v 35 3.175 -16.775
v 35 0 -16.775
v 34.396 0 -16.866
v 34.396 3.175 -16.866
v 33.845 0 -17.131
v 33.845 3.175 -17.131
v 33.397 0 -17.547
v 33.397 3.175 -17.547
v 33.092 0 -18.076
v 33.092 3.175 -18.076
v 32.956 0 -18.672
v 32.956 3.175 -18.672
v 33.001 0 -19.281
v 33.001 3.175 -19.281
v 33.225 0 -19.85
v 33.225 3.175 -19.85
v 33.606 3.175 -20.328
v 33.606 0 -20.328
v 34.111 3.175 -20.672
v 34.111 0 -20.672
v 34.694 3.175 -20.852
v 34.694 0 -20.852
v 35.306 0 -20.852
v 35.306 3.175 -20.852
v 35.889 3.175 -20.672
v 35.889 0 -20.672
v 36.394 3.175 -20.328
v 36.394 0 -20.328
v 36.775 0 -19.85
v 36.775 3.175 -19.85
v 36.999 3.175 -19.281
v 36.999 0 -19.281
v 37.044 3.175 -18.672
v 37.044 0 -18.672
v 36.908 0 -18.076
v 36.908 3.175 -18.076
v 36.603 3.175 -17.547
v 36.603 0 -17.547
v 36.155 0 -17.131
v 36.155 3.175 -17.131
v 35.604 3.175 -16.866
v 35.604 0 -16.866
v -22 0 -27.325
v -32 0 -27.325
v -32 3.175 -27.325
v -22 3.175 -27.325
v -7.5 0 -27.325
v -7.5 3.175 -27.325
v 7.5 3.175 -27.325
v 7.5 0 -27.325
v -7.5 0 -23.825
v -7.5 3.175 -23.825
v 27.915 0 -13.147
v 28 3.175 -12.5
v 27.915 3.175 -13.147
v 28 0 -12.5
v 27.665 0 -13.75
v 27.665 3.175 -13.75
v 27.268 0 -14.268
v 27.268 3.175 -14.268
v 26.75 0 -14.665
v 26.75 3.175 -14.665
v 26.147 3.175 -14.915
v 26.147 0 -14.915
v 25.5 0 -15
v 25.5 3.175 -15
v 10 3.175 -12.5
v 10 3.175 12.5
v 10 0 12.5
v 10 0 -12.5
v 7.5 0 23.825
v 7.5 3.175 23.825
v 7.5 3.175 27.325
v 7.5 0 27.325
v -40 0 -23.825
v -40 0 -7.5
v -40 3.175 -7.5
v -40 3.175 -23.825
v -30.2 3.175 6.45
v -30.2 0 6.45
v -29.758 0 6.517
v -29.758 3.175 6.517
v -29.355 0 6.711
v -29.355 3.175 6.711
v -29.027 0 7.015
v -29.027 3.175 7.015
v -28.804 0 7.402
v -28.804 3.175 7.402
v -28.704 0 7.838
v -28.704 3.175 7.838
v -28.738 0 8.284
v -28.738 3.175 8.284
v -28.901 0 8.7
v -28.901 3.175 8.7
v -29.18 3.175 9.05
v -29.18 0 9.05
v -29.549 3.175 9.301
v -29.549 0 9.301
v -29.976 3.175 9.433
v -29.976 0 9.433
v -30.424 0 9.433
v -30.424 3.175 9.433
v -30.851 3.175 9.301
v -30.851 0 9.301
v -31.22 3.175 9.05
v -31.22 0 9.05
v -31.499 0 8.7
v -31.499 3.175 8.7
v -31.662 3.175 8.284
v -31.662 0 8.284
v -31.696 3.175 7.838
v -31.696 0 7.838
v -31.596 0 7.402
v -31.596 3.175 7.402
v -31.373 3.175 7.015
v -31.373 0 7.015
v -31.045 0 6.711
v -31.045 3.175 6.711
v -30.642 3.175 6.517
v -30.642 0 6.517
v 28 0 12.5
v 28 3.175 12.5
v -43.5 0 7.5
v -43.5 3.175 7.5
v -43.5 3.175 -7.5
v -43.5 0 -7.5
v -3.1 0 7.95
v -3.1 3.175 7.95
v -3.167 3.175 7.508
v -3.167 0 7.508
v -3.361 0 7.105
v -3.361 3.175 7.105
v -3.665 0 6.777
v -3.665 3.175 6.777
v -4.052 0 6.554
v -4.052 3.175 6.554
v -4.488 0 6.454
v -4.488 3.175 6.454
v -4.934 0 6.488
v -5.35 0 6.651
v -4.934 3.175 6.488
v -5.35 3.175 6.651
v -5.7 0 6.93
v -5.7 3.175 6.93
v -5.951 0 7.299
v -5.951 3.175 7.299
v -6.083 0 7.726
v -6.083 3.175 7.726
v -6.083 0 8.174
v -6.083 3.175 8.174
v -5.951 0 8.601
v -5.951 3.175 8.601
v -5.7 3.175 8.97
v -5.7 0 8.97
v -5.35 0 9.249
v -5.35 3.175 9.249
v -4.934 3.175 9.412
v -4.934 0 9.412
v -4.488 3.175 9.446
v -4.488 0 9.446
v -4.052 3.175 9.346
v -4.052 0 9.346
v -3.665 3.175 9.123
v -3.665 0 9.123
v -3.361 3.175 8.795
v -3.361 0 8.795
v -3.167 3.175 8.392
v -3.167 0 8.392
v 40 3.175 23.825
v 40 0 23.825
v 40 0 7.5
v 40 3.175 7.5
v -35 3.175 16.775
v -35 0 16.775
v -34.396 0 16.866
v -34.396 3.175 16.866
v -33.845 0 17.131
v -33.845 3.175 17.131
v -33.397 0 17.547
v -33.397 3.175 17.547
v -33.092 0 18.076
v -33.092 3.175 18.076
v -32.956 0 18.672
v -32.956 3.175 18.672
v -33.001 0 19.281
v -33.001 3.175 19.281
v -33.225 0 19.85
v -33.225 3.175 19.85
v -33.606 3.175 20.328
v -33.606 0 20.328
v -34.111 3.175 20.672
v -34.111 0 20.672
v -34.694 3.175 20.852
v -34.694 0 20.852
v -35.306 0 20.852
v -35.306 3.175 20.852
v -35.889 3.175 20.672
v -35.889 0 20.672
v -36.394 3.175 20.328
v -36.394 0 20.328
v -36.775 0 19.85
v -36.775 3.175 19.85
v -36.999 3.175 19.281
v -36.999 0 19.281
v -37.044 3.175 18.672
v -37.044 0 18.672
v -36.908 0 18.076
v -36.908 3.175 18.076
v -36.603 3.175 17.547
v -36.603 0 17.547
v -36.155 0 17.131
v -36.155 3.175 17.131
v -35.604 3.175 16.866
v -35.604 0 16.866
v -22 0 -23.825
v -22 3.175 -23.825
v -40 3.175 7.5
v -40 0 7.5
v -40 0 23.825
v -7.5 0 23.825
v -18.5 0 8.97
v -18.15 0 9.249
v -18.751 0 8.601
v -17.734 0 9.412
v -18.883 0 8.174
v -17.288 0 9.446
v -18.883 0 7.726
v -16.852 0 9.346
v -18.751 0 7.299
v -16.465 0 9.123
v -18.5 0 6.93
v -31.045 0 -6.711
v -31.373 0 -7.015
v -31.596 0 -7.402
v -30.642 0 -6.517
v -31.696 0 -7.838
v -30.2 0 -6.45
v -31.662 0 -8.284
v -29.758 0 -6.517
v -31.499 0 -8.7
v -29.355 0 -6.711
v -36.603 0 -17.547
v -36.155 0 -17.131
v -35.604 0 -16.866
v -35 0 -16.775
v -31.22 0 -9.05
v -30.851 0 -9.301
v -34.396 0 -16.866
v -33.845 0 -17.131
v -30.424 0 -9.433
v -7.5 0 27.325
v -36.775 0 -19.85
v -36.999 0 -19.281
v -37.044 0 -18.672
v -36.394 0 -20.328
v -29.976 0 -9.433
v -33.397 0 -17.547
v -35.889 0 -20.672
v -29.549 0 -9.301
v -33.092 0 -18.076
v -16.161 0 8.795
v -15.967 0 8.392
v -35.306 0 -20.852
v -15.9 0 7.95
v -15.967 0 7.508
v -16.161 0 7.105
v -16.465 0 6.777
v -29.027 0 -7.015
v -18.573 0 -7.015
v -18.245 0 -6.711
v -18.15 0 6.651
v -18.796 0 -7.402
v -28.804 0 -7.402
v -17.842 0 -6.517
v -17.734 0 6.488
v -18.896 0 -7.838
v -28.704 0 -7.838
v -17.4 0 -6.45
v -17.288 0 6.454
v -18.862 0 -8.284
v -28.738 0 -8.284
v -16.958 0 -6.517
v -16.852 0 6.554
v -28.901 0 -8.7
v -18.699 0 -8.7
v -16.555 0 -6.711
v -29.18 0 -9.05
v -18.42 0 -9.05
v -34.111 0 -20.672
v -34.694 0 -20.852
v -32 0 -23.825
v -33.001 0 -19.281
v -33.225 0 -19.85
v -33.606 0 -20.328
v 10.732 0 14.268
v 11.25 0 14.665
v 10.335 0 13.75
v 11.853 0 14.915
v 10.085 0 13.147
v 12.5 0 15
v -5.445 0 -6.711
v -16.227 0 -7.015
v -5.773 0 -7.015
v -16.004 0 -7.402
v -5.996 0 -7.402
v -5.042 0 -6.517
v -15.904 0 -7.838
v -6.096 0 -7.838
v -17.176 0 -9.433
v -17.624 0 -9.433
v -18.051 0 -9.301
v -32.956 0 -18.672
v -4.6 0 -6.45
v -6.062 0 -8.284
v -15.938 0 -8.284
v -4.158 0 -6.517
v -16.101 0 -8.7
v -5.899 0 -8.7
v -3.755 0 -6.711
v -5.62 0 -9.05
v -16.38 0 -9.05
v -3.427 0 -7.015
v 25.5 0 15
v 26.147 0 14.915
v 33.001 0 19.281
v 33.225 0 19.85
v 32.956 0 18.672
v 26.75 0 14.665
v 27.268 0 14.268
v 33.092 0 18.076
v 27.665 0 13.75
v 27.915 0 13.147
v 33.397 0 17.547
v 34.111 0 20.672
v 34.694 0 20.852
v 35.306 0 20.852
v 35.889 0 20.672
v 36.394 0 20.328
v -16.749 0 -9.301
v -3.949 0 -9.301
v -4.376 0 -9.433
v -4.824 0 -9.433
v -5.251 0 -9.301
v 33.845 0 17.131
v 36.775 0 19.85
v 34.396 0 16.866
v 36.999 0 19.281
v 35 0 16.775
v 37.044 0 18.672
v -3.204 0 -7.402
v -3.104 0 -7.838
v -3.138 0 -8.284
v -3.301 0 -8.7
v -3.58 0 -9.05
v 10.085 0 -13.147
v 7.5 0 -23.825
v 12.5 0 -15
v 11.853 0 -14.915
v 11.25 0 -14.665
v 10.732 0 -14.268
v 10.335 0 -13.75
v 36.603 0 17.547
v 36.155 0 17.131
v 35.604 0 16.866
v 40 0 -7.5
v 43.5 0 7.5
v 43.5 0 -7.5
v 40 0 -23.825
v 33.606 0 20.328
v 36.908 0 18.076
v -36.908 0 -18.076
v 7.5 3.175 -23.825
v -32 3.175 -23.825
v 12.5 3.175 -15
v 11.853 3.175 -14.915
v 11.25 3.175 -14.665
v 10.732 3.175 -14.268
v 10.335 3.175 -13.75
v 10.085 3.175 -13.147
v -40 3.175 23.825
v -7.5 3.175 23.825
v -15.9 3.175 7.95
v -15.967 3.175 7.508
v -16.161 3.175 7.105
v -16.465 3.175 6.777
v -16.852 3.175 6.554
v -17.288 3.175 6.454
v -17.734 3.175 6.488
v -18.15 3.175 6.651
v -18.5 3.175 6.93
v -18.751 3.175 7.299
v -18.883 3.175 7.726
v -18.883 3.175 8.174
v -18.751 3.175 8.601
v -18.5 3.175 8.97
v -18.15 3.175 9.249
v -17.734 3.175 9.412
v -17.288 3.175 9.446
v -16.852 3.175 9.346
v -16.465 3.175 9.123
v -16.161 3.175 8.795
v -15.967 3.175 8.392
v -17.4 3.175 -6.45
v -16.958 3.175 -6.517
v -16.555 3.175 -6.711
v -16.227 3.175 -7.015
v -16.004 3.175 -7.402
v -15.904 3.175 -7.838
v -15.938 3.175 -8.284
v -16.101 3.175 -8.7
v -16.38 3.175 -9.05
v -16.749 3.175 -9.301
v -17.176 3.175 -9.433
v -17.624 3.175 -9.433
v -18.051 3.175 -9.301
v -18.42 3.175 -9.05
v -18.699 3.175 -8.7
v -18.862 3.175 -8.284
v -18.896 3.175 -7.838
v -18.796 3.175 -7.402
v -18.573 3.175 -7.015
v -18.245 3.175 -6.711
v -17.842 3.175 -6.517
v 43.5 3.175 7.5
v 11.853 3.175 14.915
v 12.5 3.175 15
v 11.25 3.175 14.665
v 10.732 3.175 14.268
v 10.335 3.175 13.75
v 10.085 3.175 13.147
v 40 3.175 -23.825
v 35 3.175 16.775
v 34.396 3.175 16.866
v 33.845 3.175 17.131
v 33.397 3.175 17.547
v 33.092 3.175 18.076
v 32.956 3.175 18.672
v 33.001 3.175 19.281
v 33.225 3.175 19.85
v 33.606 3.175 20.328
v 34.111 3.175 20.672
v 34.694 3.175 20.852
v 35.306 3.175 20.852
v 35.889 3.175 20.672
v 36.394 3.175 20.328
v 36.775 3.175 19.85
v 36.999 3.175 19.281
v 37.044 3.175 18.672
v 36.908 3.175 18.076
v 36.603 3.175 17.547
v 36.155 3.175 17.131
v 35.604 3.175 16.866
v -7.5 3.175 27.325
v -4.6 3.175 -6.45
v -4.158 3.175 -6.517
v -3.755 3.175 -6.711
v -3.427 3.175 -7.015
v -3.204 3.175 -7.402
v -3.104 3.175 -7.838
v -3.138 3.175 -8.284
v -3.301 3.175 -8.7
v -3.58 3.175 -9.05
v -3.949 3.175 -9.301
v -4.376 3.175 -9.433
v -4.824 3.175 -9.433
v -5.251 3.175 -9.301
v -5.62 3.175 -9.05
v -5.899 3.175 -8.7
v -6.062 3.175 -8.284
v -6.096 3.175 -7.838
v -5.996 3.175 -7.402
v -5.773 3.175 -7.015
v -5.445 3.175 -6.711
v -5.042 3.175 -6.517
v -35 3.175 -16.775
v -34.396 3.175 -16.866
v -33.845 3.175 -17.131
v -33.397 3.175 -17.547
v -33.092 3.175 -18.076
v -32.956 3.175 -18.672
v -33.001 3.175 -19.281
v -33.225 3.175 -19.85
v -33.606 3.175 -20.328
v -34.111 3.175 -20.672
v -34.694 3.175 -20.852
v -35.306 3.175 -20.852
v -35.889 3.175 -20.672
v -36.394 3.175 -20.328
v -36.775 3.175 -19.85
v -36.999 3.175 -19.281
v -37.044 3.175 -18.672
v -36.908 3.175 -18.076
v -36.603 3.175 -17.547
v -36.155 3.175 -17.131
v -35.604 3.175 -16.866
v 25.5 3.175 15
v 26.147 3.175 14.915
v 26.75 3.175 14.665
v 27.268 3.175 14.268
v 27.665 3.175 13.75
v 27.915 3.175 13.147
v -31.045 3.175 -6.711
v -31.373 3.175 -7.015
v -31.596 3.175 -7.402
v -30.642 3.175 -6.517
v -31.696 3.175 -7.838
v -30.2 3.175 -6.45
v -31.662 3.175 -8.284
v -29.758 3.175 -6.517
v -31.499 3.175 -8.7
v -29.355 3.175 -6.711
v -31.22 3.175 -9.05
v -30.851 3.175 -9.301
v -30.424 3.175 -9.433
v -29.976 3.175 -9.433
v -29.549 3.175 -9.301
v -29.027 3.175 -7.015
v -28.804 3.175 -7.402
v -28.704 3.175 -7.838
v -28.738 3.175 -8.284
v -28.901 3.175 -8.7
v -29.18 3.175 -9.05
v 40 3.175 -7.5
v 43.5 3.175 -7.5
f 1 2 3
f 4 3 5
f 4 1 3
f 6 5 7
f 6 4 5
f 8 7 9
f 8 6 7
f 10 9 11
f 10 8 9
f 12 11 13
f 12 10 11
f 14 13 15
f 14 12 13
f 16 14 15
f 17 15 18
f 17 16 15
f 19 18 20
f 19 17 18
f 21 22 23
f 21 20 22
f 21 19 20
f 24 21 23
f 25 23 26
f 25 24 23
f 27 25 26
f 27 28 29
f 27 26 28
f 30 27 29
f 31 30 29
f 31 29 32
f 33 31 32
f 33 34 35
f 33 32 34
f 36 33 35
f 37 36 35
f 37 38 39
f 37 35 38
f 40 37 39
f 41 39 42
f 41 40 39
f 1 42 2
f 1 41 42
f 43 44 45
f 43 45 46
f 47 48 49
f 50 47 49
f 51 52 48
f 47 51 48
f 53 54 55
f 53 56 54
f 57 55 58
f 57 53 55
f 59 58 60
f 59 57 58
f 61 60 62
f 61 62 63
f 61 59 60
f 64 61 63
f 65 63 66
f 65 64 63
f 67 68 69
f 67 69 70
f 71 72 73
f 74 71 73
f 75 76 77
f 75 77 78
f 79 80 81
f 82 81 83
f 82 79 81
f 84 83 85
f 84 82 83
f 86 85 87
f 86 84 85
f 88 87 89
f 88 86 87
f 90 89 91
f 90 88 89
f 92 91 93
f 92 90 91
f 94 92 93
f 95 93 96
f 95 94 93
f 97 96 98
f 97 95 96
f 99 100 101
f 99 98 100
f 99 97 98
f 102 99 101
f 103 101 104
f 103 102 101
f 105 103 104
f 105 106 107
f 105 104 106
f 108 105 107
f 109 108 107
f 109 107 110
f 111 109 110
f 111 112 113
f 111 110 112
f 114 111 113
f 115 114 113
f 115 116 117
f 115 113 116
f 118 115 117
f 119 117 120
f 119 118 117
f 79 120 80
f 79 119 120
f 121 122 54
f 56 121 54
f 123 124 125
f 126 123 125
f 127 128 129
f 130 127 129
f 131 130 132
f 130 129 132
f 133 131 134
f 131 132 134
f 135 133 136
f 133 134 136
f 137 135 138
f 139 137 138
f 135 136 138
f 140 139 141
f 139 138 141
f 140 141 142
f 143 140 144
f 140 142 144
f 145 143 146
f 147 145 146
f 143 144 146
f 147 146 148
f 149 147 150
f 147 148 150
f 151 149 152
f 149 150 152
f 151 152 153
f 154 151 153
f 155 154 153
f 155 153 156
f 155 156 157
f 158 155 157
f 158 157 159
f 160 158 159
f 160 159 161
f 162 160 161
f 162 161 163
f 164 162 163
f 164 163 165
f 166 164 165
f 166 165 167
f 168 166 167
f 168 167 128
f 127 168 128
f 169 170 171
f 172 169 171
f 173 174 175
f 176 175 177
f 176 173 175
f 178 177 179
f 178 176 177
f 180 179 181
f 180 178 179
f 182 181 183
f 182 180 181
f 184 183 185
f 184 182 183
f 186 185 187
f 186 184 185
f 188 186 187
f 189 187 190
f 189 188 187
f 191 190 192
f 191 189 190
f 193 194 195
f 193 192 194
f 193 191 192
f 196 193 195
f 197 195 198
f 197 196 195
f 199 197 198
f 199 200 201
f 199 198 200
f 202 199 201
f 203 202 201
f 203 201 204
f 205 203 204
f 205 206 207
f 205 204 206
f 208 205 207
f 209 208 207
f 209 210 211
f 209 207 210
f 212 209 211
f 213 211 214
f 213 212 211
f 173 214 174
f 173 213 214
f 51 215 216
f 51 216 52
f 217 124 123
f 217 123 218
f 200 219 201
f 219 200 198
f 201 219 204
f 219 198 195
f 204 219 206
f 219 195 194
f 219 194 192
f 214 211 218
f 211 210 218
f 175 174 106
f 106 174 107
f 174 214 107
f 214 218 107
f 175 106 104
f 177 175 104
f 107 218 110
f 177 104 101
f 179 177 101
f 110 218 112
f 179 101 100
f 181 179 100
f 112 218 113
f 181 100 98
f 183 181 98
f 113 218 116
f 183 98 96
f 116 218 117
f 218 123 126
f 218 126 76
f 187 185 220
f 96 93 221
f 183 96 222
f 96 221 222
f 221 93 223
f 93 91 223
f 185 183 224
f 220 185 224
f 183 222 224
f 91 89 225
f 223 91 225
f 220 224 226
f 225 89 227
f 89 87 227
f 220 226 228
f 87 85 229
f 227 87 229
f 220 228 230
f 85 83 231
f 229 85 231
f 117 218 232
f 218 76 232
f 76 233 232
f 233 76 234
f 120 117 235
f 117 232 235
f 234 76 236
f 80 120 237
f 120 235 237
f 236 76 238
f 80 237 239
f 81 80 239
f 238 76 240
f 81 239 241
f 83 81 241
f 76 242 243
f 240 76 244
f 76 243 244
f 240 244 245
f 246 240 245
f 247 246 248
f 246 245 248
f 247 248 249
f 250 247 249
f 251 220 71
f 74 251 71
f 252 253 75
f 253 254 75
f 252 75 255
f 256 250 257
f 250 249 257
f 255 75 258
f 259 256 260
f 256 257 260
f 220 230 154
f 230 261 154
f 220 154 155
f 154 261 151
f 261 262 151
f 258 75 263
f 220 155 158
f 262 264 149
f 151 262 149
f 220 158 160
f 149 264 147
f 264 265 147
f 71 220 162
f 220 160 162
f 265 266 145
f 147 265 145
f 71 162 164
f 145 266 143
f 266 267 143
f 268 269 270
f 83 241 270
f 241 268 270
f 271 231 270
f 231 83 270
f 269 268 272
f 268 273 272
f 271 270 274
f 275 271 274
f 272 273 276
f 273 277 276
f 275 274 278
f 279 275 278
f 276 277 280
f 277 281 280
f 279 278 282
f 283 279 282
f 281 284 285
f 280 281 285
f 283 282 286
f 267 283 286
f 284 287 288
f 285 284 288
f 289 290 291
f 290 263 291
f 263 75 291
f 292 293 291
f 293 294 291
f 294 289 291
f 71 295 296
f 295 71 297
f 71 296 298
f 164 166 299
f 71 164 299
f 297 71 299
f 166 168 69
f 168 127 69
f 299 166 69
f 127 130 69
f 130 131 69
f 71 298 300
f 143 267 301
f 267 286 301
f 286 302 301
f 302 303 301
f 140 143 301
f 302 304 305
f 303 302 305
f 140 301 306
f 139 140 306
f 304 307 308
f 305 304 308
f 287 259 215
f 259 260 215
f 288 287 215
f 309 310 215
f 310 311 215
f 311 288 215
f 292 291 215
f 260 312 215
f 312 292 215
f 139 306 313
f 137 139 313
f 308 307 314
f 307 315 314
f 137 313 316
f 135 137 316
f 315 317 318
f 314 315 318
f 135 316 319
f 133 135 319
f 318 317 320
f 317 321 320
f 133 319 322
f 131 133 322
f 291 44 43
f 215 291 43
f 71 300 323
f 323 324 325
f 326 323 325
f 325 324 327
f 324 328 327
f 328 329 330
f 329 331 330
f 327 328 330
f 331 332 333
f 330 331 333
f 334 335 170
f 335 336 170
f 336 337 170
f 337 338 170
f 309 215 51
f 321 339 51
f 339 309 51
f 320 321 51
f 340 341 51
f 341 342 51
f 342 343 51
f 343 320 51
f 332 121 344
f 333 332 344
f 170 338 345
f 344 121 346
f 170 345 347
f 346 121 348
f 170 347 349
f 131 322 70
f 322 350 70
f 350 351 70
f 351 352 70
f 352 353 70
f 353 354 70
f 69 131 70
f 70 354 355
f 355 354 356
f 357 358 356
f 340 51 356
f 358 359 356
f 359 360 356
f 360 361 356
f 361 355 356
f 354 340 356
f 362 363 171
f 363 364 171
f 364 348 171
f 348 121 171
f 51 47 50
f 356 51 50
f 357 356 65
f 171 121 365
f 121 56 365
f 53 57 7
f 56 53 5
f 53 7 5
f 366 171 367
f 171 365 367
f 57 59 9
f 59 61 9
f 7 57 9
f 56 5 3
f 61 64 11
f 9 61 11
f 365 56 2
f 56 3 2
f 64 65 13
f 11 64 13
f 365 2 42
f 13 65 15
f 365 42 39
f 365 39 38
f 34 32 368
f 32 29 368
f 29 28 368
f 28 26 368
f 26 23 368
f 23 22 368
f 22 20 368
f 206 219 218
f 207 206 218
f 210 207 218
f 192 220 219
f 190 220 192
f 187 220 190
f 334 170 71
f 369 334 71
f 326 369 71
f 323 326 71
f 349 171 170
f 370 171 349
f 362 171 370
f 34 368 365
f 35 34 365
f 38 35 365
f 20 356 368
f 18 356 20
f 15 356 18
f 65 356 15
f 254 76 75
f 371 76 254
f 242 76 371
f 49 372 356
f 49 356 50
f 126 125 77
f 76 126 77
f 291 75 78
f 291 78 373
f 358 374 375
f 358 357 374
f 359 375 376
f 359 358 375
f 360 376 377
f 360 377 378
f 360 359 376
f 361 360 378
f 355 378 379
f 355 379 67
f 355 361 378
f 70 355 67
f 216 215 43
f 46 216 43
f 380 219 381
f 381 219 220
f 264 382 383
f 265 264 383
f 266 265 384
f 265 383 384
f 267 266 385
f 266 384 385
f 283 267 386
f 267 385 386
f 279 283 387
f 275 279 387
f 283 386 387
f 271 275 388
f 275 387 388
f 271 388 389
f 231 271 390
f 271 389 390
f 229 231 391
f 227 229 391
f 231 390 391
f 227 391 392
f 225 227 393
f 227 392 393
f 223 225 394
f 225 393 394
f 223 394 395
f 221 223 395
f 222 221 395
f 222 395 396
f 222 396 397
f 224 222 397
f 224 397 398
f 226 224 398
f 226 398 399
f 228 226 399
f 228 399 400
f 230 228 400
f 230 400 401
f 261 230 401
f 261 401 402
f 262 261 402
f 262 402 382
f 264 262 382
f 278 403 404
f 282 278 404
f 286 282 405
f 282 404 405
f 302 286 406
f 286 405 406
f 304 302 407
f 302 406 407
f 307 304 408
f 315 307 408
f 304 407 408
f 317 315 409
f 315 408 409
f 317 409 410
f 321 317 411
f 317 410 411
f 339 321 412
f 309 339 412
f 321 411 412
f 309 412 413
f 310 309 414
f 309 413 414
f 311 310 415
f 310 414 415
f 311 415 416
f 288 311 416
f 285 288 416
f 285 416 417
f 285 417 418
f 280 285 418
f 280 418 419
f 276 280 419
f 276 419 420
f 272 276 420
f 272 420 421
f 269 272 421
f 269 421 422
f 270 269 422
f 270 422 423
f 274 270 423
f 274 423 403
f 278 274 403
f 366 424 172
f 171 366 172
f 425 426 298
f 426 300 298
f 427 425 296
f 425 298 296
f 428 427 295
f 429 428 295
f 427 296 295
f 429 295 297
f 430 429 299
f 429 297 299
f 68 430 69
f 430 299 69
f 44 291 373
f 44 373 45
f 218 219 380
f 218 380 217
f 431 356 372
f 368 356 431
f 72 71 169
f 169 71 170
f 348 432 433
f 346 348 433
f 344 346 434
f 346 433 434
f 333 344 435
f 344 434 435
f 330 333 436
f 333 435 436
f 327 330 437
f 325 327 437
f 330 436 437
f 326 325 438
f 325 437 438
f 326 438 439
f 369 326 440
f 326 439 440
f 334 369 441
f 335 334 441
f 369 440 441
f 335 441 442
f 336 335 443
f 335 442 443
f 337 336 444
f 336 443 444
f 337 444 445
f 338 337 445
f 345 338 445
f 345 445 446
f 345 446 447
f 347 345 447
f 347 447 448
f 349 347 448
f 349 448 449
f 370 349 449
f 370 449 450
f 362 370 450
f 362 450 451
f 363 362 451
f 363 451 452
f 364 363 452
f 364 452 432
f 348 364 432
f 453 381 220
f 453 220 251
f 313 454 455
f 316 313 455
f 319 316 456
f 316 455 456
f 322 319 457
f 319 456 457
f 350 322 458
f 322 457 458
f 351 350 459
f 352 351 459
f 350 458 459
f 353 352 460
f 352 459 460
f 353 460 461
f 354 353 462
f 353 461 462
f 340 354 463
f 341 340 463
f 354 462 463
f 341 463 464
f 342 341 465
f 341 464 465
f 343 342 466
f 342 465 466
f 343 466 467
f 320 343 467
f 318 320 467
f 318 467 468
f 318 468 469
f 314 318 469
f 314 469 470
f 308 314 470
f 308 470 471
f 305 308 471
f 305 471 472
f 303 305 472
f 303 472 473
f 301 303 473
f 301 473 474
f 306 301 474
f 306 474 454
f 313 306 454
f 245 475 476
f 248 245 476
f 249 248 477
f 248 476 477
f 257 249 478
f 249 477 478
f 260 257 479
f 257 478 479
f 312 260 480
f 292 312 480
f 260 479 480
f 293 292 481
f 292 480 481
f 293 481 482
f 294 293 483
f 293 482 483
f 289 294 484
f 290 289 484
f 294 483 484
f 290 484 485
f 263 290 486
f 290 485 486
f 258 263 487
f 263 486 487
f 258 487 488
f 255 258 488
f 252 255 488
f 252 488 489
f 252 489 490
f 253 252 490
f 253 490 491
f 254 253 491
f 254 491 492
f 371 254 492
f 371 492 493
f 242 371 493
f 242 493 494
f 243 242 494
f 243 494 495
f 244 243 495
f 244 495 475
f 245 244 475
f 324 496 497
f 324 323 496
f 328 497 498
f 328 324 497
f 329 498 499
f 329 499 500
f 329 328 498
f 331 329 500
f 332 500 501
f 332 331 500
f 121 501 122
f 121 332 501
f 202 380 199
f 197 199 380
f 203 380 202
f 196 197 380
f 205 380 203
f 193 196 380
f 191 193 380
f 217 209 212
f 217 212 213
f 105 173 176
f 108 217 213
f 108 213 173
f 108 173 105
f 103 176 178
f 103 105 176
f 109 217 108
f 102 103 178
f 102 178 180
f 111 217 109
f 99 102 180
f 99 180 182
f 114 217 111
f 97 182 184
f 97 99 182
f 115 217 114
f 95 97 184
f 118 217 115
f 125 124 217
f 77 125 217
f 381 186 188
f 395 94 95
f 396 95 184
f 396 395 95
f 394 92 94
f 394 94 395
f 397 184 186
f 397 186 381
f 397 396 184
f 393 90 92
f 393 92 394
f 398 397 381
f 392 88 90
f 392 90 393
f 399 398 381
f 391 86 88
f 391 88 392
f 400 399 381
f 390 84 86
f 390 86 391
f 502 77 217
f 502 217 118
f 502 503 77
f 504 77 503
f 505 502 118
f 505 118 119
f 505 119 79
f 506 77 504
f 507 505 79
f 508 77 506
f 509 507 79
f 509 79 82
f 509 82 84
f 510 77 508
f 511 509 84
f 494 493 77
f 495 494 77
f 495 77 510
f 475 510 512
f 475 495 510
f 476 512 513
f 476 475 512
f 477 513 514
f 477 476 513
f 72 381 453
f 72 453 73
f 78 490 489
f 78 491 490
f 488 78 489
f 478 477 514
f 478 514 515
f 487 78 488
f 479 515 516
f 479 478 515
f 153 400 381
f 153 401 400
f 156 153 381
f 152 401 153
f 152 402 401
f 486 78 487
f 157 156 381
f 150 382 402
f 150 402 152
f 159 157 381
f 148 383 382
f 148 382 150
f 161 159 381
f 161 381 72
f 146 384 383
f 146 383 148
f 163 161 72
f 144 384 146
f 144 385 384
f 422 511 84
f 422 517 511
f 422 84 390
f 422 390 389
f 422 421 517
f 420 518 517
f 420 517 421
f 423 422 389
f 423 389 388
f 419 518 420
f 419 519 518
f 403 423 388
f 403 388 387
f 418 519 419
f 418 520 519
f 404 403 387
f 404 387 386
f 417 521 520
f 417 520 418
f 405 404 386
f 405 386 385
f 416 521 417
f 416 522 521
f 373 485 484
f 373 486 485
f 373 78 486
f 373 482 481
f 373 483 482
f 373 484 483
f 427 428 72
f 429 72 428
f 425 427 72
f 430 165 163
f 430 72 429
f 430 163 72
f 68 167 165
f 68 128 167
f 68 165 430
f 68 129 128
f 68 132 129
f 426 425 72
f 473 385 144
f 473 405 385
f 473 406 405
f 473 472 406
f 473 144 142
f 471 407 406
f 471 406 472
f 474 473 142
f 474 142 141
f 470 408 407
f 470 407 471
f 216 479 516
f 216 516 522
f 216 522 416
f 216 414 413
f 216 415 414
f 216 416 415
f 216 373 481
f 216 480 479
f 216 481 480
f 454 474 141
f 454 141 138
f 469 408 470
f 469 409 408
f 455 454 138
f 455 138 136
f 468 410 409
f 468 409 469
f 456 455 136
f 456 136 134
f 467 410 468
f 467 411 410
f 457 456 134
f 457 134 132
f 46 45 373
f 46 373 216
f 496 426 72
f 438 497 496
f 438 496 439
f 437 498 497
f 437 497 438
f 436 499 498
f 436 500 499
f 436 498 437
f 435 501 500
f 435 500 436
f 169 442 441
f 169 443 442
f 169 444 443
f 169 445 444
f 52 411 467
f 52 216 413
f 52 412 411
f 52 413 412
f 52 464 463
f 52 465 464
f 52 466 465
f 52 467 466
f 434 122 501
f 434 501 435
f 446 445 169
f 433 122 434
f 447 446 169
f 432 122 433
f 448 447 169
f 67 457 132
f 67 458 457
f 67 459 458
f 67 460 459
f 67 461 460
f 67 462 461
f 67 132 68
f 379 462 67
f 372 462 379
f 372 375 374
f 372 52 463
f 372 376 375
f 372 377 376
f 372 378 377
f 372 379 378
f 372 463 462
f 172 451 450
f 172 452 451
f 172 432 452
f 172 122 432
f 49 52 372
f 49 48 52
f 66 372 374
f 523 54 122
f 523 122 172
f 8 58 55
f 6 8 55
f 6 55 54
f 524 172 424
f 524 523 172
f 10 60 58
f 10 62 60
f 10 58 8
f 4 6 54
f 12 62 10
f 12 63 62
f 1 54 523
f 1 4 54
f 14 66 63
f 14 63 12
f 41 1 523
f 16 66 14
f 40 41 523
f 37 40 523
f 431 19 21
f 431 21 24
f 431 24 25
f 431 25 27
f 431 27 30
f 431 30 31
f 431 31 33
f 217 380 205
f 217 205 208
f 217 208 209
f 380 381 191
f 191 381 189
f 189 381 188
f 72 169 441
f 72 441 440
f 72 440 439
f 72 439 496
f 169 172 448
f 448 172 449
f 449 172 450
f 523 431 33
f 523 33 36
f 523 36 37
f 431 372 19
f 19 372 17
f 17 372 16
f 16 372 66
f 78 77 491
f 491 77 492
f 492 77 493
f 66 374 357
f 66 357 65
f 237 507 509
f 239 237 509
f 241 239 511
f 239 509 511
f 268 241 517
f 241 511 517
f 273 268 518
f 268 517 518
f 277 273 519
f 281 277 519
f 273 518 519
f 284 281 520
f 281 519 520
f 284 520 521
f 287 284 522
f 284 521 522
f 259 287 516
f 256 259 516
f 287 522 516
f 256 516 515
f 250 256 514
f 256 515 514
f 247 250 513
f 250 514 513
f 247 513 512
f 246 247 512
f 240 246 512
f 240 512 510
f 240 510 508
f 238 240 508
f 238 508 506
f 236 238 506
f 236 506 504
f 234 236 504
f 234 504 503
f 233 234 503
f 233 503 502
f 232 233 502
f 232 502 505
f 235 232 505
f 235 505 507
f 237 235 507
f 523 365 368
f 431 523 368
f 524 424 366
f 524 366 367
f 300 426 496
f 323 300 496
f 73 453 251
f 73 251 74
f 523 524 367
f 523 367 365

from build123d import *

# Parameters (mm, degrees)
SKETCH2_W               = 80
SKETCH2_H               = 47.65
BOSS_EXTRUDE1_DEPTH     = 3.175
SKETCH3_W               = 15
SKETCH3_H               = 3.5
BOSS_EXTRUDE2_DEPTH     = 3.175
SKETCH4_W               = 3.5
SKETCH4_H               = 15
BOSS_EXTRUDE3_DEPTH     = 3.175
MIRROR2_COPY_1_SKETCH_W = 3.5
MIRROR2_COPY_1_SKETCH_H = 15
MIRROR2_COPY_1_DEPTH    = 3.175
MIRROR2_COPY_2_SKETCH_W = 3.5
MIRROR2_COPY_2_SKETCH_H = 15
MIRROR2_COPY_2_DEPTH    = 3.175
SKETCH5_R               = 2.05
CUT_EXTRUDE1_DEPTH      = 20
SKETCH6_W               = 18
SKETCH6_H               = 30
CUT_EXTRUDE2_DEPTH      = 52.468303353
FILLET1_R               = 2.5
MIRROR4_COPY_1_SKETCH_R = 2.05
MIRROR4_COPY_1_DEPTH    = 20
SKETCH8_R               = 1.5
CUT_EXTRUDE4_DEPTH      = 10
LPATTERN1_COUNT         = 3
LPATTERN1_PITCH         = 12.8
MIRROR5_COPY_1_SKETCH_R = 1.5
MIRROR5_COPY_1_DEPTH    = 10
MIRROR5_COPY_2_SKETCH_R = 1.5
MIRROR5_COPY_2_DEPTH    = 10
SKETCH9_W               = 10
SKETCH9_H               = 3.5
BOSS_EXTRUDE4_DEPTH     = 3.175


with BuildPart() as part:
    # Sketch2 → Boss-Extrude1 (new body)
    with BuildSketch(Plane(origin=(0, 0, 0), x_dir=(1, 0, 0), z_dir=(0, 1, 0))):
        Rectangle(SKETCH2_W, SKETCH2_H)
    extrude(amount=BOSS_EXTRUDE1_DEPTH)

    # Sketch3 → Boss-Extrude2 (add)
    with BuildSketch(Plane(origin=(0, 3.175, 0), x_dir=(1, 0, 0), z_dir=(0, 1, 0))):
        with Locations((0, 25.575)):
            Rectangle(SKETCH3_W, SKETCH3_H)
    boss_extrude2 = extrude(amount=-BOSS_EXTRUDE2_DEPTH)

    # Sketch4 → Boss-Extrude3 (add)
    with BuildSketch(Plane(origin=(0, 3.175, 0), x_dir=(1, 0, 0), z_dir=(0, 1, 0))):
        with Locations((-41.75, 0)):
            Rectangle(SKETCH4_W, SKETCH4_H)
    boss_extrude3 = extrude(amount=-BOSS_EXTRUDE3_DEPTH)

    # Mirror1: Boss-Extrude3 across plane
    add(boss_extrude3.mirror(Plane(origin=(0, 0, 0), x_dir=(0, 0, 1), z_dir=(1, 0, 0))))

    # Mirror2: Boss-Extrude2 across plane
    add(boss_extrude2.mirror(Plane.XY))

    # Mirror2 copy 1 sketch → Mirror2 copy 1 (add)
    with BuildSketch(Plane(origin=(0, 3.175, 0), x_dir=(-1, 0, 0), z_dir=(0, 1, 0))):
        with Locations((-41.75, 0)):
            Rectangle(MIRROR2_COPY_1_SKETCH_W, MIRROR2_COPY_1_SKETCH_H)
    extrude(amount=-MIRROR2_COPY_1_DEPTH)

    # Mirror2 copy 2 sketch → Mirror2 copy 2 (add)
    with BuildSketch(Plane(origin=(0, 3.175, 0), x_dir=(1, 0, 0), z_dir=(0, 1, 0))):
        with Locations((-41.75, 0)):
            Rectangle(MIRROR2_COPY_2_SKETCH_W, MIRROR2_COPY_2_SKETCH_H)
    extrude(amount=-MIRROR2_COPY_2_DEPTH)

    # Sketch5 → Cut-Extrude1 (cut)
    with BuildSketch(Plane(origin=(0, 3.175, 0), x_dir=(1, 0, 0), z_dir=(0, 1, 0))):
        with Locations(Location((-35, 18.825, 0), (0, 0, 270))):
            Circle(SKETCH5_R)
    cut_extrude1 = extrude(amount=-CUT_EXTRUDE1_DEPTH, mode=Mode.SUBTRACT)

    # Sketch6 → Cut-Extrude2 (cut, through all)
    with BuildSketch(Plane(origin=(0, 3.175, 0), x_dir=(1, 0, 0), z_dir=(0, 1, 0))):
        with Locations((19, 0)):
            Rectangle(SKETCH6_W, SKETCH6_H)
    extrude(amount=-CUT_EXTRUDE2_DEPTH, mode=Mode.SUBTRACT)

    # Fillet1
    fillet1_edges = [part.edges().sort_by_distance(p)[0] for p in [
        (10, 1.5875, 15),
        (10, 1.5875, -15),
        (28, 1.5875, -15),
        (28, 1.5875, 15),
    ]]
    fillet(fillet1_edges, radius=FILLET1_R)

    # Mirror3: Cut-Extrude1 across plane
    add(cut_extrude1.mirror(Plane(origin=(0, 0, 0), x_dir=(0, 0, 1), z_dir=(1, 0, 0))), mode=Mode.SUBTRACT)

    # Mirror4: Cut-Extrude1 across plane
    add(cut_extrude1.mirror(Plane.XY), mode=Mode.SUBTRACT)

    # Mirror4 copy 1 sketch → Mirror4 copy 1 (cut)
    with BuildSketch(Plane(origin=(0, 3.175, 0), x_dir=(-1, 0, 0), z_dir=(0, 1, 0))):
        with Locations(Location((-35, 18.825, 0), (0, 0, 270))):
            Circle(MIRROR4_COPY_1_SKETCH_R)
    extrude(amount=-MIRROR4_COPY_1_DEPTH, mode=Mode.SUBTRACT)

    # Sketch8 → Cut-Extrude4 (cut)
    with BuildSketch(Plane(origin=(0, 3.175, 0), x_dir=(1, 0, 0), z_dir=(0, 1, 0))):
        with Locations(Location((-30.2, 7.95, 0), (0, 0, 270))):
            Circle(SKETCH8_R)
    cut_extrude4 = extrude(amount=-CUT_EXTRUDE4_DEPTH, mode=Mode.SUBTRACT)

    # LPattern1: Cut-Extrude4 ×3
    with Locations(*[(i * LPATTERN1_PITCH, 0, 0) for i in range(1, LPATTERN1_COUNT)]):
        add(cut_extrude4, mode=Mode.SUBTRACT)

    # Mirror5: Cut-Extrude4 across plane
    add(cut_extrude4.mirror(Plane.XY), mode=Mode.SUBTRACT)

    # Mirror5 copy 1 sketch → Mirror5 copy 1 (cut)
    with BuildSketch(Plane(origin=(12.8, 3.175, 0), x_dir=(1, 0, 0), z_dir=(0, 1, 0))):
        with Locations((-30.2, -7.95)):
            Circle(MIRROR5_COPY_1_SKETCH_R)
    extrude(amount=-MIRROR5_COPY_1_DEPTH, mode=Mode.SUBTRACT)

    # Mirror5 copy 2 sketch → Mirror5 copy 2 (cut)
    with BuildSketch(Plane(origin=(25.6, 3.175, 0), x_dir=(1, 0, 0), z_dir=(0, 1, 0))):
        with Locations((-30.2, -7.95)):
            Circle(MIRROR5_COPY_2_SKETCH_R)
    extrude(amount=-MIRROR5_COPY_2_DEPTH, mode=Mode.SUBTRACT)

    # Sketch9 → Boss-Extrude4 (add)
    with BuildSketch(Plane(origin=(0, 0, 0), x_dir=(1, 0, 0), z_dir=(0, 1, 0))):
        with Locations((-27, 25.575)):
            Rectangle(SKETCH9_W, SKETCH9_H)
    extrude(amount=BOSS_EXTRUDE4_DEPTH)


solid = part.part
